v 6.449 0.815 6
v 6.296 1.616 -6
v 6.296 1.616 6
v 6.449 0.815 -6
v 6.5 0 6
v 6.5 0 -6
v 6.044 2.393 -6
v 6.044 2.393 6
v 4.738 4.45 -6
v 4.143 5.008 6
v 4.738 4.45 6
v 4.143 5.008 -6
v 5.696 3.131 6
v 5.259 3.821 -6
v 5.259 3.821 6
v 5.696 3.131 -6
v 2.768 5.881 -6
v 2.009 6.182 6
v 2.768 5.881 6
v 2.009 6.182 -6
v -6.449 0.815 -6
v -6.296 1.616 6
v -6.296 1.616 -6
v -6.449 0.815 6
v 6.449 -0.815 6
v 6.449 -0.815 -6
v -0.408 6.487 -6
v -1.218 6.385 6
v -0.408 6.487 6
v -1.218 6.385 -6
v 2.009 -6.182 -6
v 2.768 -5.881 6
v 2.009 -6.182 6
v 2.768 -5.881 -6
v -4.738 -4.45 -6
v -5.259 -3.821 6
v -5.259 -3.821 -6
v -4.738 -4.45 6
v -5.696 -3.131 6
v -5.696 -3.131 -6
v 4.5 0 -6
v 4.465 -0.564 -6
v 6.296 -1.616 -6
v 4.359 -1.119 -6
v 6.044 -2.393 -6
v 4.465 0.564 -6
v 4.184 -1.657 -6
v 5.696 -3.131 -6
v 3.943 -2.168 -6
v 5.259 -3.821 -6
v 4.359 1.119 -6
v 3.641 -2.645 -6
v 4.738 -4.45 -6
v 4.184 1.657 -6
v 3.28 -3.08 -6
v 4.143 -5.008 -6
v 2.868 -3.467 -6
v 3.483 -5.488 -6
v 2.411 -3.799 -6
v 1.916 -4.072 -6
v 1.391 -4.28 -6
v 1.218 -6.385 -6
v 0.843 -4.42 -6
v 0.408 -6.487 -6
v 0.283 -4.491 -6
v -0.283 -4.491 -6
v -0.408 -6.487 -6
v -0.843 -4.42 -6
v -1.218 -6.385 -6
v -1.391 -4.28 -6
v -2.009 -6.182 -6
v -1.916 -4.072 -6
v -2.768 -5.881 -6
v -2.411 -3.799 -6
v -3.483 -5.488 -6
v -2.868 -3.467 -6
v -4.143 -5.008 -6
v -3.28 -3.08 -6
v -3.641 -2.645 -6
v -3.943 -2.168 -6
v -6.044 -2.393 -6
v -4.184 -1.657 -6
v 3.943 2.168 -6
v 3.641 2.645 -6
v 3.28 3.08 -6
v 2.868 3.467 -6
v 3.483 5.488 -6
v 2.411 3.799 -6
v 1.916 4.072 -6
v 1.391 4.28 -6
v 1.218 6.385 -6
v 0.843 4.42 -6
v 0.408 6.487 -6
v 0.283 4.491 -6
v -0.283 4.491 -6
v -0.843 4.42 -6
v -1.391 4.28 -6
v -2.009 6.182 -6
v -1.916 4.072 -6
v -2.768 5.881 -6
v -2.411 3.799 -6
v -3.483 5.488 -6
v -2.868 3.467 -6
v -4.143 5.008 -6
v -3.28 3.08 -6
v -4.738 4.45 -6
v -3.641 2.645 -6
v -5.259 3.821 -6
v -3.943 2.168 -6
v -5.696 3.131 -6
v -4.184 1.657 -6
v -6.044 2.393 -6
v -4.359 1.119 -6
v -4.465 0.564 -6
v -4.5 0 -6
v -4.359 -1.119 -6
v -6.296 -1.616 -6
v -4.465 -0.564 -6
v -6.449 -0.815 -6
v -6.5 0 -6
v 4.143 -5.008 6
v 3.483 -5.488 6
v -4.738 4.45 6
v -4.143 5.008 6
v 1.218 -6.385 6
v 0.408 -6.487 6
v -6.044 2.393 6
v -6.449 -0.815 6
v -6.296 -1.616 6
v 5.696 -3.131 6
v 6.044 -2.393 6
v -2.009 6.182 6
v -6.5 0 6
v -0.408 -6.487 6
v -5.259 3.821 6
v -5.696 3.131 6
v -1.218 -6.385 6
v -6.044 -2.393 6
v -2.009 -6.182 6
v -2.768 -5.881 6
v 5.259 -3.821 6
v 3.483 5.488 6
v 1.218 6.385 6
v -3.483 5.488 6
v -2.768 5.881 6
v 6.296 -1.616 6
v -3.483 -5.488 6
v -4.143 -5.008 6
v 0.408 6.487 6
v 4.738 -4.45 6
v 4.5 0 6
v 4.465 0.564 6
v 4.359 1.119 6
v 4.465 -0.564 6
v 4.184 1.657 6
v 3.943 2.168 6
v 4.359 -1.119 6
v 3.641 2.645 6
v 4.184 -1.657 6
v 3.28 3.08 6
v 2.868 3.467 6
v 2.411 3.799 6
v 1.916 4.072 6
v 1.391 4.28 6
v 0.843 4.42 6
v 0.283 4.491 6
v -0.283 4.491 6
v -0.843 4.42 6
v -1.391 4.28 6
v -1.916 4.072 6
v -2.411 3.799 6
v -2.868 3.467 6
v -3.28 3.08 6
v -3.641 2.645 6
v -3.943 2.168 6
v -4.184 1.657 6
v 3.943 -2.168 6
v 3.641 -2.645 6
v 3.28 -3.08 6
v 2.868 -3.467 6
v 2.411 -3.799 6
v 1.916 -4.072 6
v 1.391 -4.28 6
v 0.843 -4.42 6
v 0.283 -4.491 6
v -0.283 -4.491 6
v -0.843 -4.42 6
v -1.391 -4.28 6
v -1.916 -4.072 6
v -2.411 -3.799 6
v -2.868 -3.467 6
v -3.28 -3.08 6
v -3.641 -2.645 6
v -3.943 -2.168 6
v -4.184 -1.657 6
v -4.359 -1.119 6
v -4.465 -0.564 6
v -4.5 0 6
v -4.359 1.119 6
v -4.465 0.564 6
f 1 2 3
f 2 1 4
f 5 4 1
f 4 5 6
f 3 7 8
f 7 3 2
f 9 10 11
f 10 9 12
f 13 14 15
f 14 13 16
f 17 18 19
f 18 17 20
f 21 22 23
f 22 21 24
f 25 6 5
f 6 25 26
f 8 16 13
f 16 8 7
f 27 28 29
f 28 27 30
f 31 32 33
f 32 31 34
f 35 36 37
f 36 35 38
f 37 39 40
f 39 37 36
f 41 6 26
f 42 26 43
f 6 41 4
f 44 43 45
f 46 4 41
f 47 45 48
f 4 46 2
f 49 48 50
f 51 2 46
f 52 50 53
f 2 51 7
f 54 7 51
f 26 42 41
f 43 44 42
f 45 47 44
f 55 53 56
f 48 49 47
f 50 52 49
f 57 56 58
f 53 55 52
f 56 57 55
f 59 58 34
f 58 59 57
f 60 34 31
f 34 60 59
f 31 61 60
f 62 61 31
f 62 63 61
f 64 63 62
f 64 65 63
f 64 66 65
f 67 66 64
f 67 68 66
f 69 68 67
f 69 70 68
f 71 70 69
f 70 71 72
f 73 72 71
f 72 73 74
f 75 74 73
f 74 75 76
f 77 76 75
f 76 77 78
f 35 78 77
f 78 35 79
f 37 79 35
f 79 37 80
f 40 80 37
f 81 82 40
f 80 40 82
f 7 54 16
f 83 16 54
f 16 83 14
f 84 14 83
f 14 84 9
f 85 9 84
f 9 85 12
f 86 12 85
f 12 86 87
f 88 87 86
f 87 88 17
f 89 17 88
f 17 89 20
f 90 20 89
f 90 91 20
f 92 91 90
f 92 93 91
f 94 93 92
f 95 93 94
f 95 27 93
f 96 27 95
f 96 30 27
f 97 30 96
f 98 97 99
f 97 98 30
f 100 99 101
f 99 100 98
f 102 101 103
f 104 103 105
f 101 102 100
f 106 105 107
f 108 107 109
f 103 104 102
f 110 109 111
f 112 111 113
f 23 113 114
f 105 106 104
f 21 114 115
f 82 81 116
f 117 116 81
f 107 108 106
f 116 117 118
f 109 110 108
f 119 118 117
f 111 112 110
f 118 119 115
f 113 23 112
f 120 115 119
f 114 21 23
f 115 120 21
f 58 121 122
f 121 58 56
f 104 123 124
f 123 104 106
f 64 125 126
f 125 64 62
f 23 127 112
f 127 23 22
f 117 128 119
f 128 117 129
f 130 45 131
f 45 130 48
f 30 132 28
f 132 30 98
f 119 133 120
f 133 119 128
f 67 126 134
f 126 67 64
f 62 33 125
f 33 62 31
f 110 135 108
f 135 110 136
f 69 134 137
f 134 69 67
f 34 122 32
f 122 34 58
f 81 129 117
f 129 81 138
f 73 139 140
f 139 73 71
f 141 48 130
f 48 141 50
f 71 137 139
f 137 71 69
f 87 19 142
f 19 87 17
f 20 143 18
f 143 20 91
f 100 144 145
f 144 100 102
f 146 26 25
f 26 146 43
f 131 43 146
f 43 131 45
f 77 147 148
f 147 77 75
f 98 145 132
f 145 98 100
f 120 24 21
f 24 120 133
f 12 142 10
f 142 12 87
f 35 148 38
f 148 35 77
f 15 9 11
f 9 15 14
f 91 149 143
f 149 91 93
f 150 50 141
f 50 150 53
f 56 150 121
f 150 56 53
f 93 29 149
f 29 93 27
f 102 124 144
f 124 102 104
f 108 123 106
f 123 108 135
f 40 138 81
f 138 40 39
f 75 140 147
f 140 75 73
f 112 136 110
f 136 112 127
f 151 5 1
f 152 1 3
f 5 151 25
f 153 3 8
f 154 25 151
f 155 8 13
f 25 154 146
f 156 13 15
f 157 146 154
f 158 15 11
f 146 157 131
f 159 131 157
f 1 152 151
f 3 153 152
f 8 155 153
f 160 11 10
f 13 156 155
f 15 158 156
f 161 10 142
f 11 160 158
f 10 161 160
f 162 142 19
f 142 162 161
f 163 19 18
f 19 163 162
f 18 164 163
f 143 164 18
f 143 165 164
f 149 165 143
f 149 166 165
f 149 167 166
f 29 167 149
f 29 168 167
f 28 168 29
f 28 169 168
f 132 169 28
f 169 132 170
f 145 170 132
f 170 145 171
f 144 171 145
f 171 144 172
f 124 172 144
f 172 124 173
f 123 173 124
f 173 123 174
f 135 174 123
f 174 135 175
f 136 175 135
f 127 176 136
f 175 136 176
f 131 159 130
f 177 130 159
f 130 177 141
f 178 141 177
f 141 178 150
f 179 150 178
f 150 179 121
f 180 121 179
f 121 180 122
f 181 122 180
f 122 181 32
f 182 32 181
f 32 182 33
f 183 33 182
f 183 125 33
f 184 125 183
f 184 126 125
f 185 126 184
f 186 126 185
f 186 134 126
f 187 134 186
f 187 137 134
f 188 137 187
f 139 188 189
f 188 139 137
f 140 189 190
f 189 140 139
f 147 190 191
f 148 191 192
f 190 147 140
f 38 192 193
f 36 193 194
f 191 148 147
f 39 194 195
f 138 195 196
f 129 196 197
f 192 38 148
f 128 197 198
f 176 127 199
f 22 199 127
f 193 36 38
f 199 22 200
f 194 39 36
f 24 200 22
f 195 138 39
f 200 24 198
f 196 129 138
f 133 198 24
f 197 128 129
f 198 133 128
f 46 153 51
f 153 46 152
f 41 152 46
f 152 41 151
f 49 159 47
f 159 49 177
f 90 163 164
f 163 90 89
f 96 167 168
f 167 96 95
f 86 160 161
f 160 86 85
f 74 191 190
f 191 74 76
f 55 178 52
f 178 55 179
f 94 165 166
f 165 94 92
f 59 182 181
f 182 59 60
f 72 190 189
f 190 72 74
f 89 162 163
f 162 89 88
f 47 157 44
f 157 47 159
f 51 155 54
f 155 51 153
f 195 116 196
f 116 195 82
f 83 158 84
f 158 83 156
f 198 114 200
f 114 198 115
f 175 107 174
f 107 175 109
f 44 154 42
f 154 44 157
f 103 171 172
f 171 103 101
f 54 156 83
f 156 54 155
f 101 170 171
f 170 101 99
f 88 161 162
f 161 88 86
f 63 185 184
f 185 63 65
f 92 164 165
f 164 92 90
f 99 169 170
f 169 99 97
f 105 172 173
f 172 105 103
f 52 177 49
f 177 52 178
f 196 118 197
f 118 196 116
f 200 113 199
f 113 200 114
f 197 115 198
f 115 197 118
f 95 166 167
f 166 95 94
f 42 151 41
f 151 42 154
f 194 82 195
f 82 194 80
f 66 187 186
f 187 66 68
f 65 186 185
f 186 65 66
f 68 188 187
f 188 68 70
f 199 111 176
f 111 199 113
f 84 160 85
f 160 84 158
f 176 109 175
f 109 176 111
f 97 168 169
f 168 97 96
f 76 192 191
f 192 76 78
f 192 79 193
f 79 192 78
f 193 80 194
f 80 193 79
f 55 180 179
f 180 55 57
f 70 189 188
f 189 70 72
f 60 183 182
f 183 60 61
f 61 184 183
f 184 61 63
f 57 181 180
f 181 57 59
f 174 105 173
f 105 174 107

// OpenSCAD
$fn = 50;


difference() {
	union() {
		translate(v = [0, 0, -6.0000000000]) {
			cylinder(h = 12, r = 6.5000000000);
		}
	}
	union() {
		translate(v = [0, 0, -100.0000000000]) {
			cylinder(h = 200, r = 4.5000000000);
		}
	}
}
